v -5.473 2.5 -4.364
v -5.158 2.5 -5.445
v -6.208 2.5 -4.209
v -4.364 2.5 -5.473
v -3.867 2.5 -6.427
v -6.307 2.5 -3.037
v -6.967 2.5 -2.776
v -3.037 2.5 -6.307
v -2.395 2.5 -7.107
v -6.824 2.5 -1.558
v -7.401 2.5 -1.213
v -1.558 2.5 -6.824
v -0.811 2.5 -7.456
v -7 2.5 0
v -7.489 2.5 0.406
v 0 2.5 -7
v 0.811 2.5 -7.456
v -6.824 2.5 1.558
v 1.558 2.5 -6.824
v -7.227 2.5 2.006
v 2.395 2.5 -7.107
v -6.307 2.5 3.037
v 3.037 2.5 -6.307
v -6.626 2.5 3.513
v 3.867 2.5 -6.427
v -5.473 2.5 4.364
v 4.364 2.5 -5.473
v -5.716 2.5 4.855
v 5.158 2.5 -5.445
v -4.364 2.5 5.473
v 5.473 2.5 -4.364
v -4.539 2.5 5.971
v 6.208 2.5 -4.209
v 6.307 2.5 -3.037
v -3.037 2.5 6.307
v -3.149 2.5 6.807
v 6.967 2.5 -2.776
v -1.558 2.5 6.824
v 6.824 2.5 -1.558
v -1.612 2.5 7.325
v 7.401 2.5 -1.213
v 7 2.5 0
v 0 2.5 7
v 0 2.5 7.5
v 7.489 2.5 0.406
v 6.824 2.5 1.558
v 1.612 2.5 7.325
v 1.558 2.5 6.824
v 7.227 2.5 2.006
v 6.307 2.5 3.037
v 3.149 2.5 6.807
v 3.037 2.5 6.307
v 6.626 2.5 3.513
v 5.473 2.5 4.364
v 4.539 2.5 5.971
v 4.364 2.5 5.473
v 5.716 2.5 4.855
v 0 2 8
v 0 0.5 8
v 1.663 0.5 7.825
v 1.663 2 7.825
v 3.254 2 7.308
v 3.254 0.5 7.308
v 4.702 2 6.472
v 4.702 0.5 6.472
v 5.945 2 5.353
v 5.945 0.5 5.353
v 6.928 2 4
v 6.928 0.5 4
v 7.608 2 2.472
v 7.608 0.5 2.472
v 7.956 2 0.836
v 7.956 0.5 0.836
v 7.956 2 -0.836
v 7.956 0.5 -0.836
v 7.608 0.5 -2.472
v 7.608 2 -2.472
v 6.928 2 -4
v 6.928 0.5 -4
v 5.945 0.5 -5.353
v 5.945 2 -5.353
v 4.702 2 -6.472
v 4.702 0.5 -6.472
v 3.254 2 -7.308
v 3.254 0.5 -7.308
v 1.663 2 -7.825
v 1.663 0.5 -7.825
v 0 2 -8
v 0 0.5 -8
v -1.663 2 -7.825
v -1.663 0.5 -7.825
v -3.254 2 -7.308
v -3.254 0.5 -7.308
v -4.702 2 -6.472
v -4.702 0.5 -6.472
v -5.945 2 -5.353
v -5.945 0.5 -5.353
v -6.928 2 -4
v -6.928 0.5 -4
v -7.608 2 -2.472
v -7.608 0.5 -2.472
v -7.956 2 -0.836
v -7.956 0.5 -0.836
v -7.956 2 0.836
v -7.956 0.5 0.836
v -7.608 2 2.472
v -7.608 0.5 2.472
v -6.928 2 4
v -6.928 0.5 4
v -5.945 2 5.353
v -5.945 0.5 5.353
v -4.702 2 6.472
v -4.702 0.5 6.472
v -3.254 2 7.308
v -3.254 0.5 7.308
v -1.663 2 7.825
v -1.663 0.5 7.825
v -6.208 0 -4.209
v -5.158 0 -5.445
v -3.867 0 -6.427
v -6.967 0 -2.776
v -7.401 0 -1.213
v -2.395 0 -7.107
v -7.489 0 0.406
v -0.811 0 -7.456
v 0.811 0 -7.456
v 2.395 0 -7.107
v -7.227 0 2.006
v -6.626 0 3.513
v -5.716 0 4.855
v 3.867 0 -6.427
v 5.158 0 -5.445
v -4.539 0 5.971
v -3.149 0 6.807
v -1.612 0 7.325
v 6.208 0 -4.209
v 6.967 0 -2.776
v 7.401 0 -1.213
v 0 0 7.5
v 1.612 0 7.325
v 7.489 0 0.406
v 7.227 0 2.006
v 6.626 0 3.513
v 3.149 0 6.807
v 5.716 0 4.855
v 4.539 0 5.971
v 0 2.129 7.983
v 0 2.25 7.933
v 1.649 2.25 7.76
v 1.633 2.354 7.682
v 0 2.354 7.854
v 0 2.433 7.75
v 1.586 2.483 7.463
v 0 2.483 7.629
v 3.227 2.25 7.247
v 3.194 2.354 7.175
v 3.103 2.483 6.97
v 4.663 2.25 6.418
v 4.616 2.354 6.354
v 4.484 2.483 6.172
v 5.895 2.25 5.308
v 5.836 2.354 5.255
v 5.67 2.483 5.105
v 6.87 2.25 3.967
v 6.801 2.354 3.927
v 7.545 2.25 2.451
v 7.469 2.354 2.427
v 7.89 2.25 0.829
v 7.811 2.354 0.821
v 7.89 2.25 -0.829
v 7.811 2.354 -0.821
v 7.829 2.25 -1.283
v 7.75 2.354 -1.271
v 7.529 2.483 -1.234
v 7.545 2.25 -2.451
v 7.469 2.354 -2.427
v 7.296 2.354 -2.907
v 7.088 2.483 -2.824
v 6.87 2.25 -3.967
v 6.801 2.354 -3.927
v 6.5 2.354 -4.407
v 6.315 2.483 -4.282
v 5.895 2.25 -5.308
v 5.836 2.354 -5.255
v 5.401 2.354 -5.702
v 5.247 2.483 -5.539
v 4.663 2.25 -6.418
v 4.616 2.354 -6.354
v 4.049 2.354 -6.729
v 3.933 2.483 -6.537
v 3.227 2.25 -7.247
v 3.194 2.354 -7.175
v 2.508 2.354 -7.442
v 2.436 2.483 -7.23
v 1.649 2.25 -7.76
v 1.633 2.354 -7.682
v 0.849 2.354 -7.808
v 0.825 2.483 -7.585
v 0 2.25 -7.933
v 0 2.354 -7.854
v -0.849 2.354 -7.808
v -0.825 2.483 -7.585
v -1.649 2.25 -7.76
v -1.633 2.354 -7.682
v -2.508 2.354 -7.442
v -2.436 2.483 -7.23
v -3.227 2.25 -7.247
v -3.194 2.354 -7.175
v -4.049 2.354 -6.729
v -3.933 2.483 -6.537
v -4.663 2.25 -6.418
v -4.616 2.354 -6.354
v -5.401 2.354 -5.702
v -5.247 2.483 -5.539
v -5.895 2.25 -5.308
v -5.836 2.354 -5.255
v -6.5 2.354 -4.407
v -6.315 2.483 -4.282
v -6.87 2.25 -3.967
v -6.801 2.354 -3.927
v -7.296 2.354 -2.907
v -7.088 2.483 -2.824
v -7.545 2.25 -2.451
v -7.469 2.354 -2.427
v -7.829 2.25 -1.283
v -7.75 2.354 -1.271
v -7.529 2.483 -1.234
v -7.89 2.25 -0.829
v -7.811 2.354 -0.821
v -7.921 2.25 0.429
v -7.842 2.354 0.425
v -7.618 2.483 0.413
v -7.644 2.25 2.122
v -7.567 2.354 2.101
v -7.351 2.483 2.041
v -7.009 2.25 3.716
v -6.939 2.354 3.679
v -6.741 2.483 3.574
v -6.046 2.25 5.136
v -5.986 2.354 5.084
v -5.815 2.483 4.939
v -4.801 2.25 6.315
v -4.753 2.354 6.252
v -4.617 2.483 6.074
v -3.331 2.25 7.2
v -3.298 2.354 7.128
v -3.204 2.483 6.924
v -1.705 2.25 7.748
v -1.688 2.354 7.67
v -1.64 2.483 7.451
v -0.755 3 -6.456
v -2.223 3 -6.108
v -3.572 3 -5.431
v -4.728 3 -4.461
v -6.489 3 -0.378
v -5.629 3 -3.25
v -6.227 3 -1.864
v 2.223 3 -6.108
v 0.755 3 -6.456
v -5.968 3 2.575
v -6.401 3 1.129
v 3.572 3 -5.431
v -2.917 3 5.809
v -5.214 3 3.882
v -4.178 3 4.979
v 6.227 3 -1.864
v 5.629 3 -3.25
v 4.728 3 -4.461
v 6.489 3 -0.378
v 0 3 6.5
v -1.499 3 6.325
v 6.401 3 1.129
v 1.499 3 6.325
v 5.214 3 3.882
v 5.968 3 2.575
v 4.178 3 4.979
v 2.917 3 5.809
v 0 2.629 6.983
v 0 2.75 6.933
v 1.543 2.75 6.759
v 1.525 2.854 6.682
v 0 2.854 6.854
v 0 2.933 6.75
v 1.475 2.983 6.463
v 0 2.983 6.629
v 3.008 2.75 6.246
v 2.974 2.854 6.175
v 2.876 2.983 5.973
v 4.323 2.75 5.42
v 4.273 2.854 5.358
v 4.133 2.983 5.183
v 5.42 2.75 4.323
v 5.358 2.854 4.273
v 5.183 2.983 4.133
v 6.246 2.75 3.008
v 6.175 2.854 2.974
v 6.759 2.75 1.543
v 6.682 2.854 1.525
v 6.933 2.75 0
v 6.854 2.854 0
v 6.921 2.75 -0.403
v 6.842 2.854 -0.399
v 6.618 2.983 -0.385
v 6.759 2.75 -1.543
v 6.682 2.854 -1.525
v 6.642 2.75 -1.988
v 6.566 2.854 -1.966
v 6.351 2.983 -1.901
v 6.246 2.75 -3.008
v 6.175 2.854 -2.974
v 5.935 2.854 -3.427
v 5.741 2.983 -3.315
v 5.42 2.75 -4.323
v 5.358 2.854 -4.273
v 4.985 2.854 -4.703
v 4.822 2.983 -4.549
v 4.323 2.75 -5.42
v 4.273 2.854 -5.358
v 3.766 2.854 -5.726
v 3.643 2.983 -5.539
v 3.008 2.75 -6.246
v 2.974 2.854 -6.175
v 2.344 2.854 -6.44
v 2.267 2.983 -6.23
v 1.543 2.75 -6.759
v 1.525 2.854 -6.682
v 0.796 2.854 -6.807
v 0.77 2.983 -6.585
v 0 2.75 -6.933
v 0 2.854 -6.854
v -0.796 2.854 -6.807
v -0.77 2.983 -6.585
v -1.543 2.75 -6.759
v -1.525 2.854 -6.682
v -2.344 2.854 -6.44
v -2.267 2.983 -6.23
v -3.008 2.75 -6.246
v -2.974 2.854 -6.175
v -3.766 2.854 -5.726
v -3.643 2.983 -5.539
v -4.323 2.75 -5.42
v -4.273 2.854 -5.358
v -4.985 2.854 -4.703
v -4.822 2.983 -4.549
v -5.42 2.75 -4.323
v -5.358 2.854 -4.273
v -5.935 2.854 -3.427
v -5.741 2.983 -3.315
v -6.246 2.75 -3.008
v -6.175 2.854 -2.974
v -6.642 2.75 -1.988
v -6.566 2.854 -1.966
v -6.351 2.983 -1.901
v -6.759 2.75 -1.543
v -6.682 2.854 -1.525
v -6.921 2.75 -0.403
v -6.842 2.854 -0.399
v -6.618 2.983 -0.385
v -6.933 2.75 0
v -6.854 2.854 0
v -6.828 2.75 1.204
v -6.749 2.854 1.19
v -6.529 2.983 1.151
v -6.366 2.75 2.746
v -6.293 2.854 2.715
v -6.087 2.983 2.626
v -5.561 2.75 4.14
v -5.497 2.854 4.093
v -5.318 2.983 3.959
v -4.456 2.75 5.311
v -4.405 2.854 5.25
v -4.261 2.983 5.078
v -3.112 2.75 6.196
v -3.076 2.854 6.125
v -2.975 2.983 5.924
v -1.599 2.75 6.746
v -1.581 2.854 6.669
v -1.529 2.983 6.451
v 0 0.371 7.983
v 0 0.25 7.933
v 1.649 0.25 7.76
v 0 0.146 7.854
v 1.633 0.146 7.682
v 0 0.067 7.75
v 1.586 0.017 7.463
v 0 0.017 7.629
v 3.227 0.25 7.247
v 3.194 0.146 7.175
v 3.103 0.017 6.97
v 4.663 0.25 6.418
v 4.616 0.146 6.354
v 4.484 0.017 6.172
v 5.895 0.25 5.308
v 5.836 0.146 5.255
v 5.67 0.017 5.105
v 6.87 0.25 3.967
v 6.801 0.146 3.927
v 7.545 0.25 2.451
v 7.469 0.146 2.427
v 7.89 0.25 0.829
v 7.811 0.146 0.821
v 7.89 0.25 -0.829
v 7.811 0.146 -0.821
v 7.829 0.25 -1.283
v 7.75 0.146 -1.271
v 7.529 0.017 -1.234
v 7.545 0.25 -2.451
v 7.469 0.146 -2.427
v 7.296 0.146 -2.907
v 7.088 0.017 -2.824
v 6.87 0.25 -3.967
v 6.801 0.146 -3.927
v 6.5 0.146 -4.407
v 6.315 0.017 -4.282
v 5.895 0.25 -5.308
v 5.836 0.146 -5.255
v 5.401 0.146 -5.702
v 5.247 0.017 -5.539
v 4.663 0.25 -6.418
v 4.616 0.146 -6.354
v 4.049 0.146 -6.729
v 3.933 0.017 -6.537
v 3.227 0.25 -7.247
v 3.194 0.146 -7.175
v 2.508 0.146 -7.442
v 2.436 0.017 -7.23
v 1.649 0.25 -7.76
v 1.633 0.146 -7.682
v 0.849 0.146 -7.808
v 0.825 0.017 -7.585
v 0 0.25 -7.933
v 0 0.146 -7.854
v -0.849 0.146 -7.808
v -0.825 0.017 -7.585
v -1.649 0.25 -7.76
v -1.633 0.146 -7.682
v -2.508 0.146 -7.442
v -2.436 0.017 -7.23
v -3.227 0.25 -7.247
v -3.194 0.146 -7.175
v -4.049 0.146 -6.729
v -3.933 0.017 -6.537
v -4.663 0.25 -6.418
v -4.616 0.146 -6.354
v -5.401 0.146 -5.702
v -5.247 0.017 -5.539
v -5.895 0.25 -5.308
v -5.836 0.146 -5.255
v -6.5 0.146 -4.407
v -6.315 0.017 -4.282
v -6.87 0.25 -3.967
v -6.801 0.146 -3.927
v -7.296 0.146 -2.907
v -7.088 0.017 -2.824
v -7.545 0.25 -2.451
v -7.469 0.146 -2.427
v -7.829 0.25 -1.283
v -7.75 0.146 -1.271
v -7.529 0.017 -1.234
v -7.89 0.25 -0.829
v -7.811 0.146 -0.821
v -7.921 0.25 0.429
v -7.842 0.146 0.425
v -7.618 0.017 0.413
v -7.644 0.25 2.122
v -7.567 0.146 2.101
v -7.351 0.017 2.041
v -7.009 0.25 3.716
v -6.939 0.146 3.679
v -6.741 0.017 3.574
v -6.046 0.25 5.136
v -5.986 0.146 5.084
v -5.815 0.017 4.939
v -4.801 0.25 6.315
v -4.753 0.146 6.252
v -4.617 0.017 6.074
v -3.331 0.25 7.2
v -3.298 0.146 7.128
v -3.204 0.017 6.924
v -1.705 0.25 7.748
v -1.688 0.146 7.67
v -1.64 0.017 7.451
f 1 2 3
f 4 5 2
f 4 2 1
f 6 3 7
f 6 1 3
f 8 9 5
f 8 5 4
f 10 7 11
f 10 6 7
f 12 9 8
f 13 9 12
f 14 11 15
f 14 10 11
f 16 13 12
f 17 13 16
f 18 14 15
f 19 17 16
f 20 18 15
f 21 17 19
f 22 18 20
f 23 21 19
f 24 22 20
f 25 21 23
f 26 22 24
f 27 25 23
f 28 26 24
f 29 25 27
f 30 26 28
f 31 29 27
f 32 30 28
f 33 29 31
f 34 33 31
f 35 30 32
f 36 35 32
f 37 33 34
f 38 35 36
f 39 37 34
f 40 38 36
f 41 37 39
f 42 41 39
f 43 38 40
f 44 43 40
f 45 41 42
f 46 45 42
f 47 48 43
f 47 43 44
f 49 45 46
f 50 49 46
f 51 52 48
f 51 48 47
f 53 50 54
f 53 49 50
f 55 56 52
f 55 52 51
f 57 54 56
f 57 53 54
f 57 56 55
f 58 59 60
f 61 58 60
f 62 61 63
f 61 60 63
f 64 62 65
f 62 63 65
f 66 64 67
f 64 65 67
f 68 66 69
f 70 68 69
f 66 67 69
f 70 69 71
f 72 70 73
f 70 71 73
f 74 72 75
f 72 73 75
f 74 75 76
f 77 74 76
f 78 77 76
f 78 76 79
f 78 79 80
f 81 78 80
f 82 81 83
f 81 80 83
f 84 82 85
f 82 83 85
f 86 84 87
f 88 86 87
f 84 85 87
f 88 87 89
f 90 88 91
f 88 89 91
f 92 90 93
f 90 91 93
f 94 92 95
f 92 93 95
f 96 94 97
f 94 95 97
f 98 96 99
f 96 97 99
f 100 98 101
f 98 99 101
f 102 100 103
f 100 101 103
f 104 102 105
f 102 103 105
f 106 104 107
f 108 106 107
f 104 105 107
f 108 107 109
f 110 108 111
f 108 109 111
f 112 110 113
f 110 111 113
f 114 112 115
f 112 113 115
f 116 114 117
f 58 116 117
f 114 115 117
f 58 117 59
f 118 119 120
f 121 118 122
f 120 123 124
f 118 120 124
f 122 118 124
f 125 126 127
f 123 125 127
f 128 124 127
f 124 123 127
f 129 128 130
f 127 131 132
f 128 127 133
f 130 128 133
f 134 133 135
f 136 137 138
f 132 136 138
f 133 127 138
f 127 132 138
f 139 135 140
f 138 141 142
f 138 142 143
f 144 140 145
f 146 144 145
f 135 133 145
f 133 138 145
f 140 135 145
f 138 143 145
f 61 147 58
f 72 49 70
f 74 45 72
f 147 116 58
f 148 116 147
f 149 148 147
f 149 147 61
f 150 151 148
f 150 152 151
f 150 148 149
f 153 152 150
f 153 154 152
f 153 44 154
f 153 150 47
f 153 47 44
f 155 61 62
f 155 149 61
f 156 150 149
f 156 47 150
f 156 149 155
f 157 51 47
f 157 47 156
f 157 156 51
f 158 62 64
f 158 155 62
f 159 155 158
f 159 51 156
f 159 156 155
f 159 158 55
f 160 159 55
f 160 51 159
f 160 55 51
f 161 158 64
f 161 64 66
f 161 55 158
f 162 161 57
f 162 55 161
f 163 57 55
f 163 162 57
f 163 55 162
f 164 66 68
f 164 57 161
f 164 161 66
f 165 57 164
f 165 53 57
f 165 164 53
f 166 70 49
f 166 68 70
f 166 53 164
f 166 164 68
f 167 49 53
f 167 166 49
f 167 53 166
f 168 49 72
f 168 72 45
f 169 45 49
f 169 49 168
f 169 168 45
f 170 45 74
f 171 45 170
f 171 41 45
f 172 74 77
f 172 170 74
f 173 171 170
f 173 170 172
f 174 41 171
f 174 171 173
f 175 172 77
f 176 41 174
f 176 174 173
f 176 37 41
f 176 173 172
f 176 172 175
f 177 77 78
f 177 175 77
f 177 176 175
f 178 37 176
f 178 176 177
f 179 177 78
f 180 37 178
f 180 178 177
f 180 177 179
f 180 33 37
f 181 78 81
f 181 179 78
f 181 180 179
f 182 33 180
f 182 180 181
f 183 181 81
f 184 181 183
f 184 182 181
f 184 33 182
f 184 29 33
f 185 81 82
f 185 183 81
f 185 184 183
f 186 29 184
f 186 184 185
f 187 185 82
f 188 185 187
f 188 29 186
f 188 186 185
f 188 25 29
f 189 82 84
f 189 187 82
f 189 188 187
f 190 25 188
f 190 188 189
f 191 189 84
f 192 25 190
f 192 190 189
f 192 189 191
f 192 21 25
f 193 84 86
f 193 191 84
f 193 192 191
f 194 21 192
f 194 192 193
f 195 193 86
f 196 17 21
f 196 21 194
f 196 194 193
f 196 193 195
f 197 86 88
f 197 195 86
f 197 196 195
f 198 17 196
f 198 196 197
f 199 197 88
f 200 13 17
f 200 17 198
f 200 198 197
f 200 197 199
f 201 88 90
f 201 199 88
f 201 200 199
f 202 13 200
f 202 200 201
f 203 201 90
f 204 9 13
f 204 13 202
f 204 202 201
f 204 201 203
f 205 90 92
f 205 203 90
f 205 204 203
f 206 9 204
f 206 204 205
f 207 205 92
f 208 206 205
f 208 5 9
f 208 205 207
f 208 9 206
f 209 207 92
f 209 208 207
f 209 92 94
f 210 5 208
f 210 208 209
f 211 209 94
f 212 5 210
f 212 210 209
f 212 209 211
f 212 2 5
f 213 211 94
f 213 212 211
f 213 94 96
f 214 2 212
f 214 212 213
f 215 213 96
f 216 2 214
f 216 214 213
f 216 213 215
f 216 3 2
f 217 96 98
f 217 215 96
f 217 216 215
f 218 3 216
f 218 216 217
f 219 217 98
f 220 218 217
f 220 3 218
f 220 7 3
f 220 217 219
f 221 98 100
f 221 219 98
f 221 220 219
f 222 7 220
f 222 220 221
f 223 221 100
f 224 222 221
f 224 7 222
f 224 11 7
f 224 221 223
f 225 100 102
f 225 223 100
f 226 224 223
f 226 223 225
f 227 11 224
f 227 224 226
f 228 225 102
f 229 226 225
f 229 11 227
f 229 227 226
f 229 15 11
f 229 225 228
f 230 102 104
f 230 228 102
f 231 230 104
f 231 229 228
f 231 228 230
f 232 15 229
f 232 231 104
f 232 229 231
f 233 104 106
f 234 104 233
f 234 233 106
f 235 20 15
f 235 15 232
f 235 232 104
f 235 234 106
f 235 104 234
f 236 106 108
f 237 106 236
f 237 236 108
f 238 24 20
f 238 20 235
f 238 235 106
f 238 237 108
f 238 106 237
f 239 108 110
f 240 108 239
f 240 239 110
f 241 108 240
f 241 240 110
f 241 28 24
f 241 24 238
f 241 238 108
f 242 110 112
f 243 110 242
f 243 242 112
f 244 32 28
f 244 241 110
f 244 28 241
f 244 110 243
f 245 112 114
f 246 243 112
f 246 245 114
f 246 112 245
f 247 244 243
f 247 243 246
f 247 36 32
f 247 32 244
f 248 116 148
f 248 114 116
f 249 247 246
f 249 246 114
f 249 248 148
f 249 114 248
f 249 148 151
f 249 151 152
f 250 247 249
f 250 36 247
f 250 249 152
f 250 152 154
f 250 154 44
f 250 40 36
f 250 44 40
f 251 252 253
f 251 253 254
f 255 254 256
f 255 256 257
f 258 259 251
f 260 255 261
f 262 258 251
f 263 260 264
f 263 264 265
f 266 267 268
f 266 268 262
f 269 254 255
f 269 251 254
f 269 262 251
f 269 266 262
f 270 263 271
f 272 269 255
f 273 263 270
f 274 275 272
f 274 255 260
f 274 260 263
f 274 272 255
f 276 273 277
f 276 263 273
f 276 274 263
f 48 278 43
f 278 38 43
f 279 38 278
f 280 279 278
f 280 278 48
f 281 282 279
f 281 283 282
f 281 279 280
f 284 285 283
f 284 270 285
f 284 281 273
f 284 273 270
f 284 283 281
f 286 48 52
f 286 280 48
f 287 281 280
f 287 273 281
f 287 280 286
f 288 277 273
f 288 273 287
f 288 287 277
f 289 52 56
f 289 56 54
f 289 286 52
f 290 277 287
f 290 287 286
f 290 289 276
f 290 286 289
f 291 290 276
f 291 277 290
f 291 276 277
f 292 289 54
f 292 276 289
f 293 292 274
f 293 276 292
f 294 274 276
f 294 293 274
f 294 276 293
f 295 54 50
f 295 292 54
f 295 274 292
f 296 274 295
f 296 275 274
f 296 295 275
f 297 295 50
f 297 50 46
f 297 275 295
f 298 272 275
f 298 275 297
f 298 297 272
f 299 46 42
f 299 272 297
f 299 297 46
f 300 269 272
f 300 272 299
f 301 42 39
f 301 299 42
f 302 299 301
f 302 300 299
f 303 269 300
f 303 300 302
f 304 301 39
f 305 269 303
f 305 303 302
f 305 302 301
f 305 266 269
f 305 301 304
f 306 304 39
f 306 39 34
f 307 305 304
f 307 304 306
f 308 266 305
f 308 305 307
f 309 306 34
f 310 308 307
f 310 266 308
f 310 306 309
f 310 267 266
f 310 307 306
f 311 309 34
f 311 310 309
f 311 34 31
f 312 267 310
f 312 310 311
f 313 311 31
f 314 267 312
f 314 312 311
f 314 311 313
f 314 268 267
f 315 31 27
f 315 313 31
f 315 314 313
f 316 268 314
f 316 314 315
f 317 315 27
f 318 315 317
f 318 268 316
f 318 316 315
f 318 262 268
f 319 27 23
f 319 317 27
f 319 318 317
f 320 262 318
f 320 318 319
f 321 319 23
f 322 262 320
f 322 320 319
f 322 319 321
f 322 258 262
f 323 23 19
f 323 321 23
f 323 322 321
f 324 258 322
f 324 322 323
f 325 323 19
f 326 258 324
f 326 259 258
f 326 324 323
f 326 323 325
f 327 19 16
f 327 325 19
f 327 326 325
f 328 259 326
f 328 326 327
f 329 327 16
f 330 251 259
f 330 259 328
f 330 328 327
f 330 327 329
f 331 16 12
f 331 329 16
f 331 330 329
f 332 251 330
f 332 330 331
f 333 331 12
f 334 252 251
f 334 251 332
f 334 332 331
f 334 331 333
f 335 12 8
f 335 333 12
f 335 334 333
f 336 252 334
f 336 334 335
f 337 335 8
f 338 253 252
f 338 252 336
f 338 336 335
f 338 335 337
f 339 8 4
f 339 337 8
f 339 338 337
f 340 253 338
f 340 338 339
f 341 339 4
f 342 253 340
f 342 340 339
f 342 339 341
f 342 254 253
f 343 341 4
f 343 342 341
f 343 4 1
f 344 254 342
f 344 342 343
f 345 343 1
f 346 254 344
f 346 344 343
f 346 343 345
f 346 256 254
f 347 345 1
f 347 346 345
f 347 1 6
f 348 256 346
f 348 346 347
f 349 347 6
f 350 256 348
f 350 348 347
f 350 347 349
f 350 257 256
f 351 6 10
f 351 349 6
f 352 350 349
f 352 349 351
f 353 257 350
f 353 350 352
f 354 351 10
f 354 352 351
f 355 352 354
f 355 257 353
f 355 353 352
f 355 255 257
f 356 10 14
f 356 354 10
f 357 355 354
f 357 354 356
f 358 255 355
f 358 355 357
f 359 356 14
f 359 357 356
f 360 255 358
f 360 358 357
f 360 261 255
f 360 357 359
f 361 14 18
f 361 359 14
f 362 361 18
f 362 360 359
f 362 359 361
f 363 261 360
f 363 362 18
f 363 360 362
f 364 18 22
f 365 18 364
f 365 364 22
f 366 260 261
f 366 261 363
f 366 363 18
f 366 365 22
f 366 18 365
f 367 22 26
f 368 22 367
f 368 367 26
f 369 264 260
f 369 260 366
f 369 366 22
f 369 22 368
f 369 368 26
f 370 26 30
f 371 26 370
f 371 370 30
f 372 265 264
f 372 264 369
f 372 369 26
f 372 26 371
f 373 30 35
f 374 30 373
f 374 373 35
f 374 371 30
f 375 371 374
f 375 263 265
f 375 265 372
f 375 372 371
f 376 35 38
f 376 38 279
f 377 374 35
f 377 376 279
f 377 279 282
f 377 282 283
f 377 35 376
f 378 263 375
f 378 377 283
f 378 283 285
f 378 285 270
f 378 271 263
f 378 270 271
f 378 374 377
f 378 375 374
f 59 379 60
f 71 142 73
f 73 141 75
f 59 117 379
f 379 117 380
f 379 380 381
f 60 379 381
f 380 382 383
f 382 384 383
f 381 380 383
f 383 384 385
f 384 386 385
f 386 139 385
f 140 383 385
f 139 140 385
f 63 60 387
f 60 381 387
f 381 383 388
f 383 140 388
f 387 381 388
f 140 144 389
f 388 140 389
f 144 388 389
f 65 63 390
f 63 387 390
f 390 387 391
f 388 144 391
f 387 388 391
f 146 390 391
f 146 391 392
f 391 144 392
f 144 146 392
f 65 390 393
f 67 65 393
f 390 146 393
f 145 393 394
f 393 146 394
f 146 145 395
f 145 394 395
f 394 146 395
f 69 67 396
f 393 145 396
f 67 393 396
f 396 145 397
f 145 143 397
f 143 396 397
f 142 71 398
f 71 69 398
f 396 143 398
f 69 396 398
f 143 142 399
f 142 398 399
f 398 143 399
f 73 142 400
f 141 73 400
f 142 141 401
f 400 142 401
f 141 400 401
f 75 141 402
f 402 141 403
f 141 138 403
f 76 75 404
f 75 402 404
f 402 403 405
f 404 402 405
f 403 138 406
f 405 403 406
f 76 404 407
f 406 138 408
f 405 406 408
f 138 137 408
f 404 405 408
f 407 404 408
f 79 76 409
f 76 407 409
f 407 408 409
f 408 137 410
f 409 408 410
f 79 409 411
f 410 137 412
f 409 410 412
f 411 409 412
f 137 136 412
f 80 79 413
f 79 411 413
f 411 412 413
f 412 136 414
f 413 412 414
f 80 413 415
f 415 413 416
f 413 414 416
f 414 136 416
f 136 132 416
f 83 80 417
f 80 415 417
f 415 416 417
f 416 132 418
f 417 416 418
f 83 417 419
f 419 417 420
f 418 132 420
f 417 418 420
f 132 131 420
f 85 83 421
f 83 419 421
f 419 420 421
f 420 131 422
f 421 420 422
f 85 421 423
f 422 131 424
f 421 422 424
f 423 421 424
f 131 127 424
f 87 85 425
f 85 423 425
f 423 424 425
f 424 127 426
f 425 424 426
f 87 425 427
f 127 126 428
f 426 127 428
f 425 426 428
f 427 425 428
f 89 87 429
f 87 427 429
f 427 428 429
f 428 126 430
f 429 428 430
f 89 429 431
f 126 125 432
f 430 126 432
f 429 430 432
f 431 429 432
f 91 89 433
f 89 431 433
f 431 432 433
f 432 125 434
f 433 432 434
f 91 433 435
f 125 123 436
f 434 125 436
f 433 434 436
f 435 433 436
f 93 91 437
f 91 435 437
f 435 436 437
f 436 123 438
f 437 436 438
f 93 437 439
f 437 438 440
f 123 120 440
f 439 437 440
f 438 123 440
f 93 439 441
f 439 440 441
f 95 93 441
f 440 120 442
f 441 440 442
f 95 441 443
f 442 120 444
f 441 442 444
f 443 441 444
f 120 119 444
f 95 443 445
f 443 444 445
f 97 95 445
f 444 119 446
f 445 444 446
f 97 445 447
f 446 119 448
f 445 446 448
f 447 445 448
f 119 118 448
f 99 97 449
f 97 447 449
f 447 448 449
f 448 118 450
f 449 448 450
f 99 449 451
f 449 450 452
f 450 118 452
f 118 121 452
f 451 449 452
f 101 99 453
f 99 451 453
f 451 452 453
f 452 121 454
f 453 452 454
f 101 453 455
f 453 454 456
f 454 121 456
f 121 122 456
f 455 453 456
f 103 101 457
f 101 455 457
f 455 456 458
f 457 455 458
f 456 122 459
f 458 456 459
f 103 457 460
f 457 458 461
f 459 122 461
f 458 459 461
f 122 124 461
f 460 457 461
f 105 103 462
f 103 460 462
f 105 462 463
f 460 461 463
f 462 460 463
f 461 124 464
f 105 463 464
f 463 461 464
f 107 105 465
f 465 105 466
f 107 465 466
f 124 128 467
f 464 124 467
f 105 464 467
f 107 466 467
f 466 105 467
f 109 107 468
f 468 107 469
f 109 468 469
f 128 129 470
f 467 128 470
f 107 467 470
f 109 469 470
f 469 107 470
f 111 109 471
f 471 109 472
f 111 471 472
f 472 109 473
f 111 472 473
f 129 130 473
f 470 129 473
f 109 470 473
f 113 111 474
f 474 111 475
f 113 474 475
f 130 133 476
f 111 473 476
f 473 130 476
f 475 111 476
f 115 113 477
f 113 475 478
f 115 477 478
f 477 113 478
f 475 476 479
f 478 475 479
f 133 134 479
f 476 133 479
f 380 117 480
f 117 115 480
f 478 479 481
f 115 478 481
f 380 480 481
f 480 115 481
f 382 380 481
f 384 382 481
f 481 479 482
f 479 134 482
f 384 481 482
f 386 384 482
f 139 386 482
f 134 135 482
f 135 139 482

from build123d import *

# Parameters (mm, degrees)
SKETCH1_R           = 8
BOSS_EXTRUDE1_DEPTH = 2.5
SKETCH2_R           = 7
BOSS_EXTRUDE2_DEPTH = 0.5
FILLET1_R           = 0.5


with BuildPart() as part:
    # Sketch1 → Boss-Extrude1 (new body)
    with BuildSketch(Plane(origin=(0, 0, 0), x_dir=(1, 0, 0), z_dir=(0, 1, 0))):
        with Locations(Location((0, 0, 0), (0, 0, 270))):
            Circle(SKETCH1_R)
    extrude(amount=BOSS_EXTRUDE1_DEPTH)

    # Sketch2 → Boss-Extrude2 (add)
    with BuildSketch(Plane(origin=(0, 2.5, 0), x_dir=(1, 0, 0), z_dir=(0, 1, 0))):
        with Locations(Location((0, 0, 0), (0, 0, 270))):
            Circle(SKETCH2_R)
    extrude(amount=BOSS_EXTRUDE2_DEPTH)

    # Fillet1
    fillet1_edges = [part.edges().sort_by_distance(p)[0] for p in [
        (0, 0, -8),
        (0, 2.5, -8),
        (0, 3, -7),
    ]]
    fillet(fillet1_edges, radius=FILLET1_R - 0.0001)  # a hair under: the kernel refuses the full size


solid = part.part
